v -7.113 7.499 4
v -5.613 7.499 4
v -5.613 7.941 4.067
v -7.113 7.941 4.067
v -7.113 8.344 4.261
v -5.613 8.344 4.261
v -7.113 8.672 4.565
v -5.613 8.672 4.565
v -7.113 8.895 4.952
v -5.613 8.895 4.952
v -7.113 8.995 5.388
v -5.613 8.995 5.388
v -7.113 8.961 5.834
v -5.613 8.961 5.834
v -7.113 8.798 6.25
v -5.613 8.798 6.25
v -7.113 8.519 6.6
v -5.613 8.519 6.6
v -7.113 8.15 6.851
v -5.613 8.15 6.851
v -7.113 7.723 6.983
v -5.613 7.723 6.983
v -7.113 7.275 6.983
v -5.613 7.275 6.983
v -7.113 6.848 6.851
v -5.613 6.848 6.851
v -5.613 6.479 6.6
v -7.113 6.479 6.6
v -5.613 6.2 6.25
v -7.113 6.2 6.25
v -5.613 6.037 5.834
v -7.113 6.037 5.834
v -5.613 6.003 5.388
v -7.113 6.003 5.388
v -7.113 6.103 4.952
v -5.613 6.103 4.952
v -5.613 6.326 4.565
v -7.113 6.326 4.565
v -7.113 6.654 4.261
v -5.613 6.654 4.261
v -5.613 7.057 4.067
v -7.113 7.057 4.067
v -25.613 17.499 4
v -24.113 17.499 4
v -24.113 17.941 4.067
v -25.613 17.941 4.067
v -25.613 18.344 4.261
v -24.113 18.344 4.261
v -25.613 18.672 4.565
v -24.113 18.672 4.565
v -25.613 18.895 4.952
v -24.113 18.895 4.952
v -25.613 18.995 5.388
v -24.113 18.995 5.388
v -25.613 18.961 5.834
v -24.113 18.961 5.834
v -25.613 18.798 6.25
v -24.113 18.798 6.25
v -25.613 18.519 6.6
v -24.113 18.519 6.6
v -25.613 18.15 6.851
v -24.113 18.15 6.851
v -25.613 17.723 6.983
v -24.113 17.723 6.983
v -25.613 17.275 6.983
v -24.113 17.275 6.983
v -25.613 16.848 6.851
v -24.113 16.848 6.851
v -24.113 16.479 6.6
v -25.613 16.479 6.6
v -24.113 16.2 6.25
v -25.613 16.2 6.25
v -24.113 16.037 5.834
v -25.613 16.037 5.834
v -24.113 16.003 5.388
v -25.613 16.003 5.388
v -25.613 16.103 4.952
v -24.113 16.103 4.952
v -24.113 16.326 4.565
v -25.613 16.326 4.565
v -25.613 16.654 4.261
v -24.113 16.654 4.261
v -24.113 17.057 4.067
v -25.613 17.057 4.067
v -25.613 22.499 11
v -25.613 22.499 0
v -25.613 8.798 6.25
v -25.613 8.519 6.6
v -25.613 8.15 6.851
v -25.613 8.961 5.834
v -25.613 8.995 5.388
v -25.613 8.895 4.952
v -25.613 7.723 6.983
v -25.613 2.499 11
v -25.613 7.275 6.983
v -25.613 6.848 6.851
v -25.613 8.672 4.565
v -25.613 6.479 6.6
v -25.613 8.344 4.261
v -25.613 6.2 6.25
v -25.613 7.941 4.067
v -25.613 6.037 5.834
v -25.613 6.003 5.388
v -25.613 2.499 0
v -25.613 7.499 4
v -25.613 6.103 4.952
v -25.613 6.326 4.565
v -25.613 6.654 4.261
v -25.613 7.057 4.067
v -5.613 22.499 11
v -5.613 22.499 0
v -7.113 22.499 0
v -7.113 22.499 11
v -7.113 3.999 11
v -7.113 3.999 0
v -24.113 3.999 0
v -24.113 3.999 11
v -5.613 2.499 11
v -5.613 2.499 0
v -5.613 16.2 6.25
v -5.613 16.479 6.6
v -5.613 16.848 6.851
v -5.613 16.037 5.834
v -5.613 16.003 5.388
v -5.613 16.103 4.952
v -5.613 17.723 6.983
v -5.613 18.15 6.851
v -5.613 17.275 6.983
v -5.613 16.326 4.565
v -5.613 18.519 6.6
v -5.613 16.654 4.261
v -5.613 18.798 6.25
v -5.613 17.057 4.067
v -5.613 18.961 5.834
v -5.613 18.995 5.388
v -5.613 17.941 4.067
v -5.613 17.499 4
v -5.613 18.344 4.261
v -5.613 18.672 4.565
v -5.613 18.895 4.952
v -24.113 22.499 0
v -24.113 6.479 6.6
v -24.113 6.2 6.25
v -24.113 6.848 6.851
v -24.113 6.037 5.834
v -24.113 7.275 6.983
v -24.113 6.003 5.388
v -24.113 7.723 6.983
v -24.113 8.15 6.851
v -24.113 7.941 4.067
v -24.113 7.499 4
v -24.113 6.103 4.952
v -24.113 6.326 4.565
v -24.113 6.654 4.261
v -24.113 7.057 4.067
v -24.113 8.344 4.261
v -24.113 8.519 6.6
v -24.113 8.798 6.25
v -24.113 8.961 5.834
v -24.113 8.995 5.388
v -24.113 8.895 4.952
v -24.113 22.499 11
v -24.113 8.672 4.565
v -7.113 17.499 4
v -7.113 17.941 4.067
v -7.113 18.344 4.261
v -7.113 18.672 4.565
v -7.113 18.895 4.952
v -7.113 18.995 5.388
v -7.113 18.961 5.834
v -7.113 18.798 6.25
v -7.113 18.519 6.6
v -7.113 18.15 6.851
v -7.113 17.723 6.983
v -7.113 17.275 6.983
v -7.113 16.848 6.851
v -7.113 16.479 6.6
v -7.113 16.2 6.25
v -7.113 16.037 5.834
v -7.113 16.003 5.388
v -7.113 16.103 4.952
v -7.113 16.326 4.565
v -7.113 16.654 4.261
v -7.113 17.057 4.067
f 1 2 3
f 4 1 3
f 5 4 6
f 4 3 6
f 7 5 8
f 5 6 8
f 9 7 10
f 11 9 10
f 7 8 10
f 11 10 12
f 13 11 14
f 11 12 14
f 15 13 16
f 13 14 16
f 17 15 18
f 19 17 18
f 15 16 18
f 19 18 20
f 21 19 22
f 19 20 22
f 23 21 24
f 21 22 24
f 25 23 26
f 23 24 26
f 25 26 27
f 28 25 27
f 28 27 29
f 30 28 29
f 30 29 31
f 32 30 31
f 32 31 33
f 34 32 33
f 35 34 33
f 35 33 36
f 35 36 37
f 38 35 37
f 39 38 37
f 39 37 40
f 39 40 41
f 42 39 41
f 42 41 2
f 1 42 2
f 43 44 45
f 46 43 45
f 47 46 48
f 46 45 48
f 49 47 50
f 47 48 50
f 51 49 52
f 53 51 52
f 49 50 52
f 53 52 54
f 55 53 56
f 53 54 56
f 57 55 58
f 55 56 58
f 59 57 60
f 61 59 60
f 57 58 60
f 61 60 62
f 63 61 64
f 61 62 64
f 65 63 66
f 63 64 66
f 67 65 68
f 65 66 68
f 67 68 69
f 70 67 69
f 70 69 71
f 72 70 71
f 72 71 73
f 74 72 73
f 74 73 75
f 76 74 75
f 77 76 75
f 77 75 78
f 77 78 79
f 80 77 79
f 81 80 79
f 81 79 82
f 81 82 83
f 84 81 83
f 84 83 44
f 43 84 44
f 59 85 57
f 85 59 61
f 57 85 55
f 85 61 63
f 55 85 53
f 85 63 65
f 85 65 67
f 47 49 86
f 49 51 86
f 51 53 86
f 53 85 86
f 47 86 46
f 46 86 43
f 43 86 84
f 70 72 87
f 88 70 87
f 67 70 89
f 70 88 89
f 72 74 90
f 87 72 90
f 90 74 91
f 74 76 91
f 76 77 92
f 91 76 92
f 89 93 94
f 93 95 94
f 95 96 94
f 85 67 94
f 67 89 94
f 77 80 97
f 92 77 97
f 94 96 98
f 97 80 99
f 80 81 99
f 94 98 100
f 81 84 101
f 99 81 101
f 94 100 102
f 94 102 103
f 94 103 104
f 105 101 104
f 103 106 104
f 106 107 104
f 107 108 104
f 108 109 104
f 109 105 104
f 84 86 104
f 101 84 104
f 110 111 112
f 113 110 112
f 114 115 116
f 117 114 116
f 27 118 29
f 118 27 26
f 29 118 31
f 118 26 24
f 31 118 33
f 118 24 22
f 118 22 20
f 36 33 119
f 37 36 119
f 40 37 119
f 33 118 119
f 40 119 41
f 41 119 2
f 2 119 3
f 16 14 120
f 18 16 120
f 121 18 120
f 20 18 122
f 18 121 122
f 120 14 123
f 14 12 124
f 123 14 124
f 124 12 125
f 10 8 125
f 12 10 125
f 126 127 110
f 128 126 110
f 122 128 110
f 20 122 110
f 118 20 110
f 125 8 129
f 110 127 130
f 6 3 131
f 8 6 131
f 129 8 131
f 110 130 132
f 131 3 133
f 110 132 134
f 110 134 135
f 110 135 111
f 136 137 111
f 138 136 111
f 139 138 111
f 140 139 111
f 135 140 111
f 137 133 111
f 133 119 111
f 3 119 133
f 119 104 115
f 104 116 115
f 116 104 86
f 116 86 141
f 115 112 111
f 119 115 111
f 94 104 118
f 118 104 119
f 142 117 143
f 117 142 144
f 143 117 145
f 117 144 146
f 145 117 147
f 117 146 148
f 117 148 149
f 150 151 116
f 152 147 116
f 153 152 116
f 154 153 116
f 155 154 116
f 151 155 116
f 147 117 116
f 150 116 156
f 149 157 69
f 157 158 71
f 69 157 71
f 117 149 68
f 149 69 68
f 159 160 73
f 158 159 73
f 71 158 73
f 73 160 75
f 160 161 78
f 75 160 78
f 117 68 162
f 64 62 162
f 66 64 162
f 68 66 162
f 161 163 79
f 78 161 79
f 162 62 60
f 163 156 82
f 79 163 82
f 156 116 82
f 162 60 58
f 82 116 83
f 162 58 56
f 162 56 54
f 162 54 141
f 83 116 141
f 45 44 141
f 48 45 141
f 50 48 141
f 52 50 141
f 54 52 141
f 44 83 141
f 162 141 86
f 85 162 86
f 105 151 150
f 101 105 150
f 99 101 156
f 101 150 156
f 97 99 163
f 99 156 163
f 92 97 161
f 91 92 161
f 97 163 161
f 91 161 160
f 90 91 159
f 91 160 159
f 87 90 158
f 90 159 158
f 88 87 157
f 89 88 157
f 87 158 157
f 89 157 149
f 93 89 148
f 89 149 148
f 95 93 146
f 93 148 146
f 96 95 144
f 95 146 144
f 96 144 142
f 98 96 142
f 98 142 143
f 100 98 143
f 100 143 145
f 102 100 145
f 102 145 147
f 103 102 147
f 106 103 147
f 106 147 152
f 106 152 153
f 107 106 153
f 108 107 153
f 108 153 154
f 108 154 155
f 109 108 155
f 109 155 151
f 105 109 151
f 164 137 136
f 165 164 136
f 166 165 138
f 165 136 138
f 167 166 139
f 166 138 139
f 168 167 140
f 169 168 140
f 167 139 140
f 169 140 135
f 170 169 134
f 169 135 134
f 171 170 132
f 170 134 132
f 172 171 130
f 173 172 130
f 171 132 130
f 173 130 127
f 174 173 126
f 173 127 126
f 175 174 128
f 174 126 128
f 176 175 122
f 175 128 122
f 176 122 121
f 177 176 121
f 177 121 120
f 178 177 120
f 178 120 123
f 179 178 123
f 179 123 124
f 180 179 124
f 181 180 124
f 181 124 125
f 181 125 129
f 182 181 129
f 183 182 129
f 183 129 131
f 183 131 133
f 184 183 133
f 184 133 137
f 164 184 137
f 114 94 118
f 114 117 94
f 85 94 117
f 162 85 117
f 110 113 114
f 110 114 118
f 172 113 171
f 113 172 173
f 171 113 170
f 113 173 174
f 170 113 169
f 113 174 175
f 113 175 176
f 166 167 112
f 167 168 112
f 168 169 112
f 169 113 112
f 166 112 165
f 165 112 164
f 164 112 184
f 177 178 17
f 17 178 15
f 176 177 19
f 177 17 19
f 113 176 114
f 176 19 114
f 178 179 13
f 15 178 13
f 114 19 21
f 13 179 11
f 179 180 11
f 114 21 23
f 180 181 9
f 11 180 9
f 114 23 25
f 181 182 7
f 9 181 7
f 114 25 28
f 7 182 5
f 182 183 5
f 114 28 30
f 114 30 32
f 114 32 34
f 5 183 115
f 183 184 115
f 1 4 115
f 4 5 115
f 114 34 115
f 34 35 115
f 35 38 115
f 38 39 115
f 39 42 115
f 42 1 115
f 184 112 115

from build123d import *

# Parameters (mm, degrees)
EXTRUSION1_DEPTH = 11
ESQUISSE3_R      = 1.5
EXTRUSION3_DEPTH = 33.050075964


with BuildPart() as part:
    # Esquisse1 → Extrusion1 (new body)
    with BuildSketch(Plane.XY):
        Polygon((-25.613160064, 22.499052632), (-25.613160064, 2.499052632), (-5.613160064, 2.499052632), (-5.613160064, 22.499052632), (-7.113160064, 22.499052632), (-7.113160064, 3.999052632), (-24.113160064, 3.999052632), (-24.113160064, 22.499052632), align=None)
    extrude(amount=EXTRUSION1_DEPTH)

    # Esquisse3 → Extrusion3 (cut, through all)
    with BuildSketch(Plane(origin=(-5.613160064, 0, 0), x_dir=(0, 0, -1), z_dir=(1, 0, 0))):
        with Locations((-5.5, 7.499052632)):
            Circle(ESQUISSE3_R)
        with Locations((-5.5, 17.499052632)):
            Circle(ESQUISSE3_R)
    extrude(amount=-EXTRUSION3_DEPTH, mode=Mode.SUBTRACT)


solid = part.part
